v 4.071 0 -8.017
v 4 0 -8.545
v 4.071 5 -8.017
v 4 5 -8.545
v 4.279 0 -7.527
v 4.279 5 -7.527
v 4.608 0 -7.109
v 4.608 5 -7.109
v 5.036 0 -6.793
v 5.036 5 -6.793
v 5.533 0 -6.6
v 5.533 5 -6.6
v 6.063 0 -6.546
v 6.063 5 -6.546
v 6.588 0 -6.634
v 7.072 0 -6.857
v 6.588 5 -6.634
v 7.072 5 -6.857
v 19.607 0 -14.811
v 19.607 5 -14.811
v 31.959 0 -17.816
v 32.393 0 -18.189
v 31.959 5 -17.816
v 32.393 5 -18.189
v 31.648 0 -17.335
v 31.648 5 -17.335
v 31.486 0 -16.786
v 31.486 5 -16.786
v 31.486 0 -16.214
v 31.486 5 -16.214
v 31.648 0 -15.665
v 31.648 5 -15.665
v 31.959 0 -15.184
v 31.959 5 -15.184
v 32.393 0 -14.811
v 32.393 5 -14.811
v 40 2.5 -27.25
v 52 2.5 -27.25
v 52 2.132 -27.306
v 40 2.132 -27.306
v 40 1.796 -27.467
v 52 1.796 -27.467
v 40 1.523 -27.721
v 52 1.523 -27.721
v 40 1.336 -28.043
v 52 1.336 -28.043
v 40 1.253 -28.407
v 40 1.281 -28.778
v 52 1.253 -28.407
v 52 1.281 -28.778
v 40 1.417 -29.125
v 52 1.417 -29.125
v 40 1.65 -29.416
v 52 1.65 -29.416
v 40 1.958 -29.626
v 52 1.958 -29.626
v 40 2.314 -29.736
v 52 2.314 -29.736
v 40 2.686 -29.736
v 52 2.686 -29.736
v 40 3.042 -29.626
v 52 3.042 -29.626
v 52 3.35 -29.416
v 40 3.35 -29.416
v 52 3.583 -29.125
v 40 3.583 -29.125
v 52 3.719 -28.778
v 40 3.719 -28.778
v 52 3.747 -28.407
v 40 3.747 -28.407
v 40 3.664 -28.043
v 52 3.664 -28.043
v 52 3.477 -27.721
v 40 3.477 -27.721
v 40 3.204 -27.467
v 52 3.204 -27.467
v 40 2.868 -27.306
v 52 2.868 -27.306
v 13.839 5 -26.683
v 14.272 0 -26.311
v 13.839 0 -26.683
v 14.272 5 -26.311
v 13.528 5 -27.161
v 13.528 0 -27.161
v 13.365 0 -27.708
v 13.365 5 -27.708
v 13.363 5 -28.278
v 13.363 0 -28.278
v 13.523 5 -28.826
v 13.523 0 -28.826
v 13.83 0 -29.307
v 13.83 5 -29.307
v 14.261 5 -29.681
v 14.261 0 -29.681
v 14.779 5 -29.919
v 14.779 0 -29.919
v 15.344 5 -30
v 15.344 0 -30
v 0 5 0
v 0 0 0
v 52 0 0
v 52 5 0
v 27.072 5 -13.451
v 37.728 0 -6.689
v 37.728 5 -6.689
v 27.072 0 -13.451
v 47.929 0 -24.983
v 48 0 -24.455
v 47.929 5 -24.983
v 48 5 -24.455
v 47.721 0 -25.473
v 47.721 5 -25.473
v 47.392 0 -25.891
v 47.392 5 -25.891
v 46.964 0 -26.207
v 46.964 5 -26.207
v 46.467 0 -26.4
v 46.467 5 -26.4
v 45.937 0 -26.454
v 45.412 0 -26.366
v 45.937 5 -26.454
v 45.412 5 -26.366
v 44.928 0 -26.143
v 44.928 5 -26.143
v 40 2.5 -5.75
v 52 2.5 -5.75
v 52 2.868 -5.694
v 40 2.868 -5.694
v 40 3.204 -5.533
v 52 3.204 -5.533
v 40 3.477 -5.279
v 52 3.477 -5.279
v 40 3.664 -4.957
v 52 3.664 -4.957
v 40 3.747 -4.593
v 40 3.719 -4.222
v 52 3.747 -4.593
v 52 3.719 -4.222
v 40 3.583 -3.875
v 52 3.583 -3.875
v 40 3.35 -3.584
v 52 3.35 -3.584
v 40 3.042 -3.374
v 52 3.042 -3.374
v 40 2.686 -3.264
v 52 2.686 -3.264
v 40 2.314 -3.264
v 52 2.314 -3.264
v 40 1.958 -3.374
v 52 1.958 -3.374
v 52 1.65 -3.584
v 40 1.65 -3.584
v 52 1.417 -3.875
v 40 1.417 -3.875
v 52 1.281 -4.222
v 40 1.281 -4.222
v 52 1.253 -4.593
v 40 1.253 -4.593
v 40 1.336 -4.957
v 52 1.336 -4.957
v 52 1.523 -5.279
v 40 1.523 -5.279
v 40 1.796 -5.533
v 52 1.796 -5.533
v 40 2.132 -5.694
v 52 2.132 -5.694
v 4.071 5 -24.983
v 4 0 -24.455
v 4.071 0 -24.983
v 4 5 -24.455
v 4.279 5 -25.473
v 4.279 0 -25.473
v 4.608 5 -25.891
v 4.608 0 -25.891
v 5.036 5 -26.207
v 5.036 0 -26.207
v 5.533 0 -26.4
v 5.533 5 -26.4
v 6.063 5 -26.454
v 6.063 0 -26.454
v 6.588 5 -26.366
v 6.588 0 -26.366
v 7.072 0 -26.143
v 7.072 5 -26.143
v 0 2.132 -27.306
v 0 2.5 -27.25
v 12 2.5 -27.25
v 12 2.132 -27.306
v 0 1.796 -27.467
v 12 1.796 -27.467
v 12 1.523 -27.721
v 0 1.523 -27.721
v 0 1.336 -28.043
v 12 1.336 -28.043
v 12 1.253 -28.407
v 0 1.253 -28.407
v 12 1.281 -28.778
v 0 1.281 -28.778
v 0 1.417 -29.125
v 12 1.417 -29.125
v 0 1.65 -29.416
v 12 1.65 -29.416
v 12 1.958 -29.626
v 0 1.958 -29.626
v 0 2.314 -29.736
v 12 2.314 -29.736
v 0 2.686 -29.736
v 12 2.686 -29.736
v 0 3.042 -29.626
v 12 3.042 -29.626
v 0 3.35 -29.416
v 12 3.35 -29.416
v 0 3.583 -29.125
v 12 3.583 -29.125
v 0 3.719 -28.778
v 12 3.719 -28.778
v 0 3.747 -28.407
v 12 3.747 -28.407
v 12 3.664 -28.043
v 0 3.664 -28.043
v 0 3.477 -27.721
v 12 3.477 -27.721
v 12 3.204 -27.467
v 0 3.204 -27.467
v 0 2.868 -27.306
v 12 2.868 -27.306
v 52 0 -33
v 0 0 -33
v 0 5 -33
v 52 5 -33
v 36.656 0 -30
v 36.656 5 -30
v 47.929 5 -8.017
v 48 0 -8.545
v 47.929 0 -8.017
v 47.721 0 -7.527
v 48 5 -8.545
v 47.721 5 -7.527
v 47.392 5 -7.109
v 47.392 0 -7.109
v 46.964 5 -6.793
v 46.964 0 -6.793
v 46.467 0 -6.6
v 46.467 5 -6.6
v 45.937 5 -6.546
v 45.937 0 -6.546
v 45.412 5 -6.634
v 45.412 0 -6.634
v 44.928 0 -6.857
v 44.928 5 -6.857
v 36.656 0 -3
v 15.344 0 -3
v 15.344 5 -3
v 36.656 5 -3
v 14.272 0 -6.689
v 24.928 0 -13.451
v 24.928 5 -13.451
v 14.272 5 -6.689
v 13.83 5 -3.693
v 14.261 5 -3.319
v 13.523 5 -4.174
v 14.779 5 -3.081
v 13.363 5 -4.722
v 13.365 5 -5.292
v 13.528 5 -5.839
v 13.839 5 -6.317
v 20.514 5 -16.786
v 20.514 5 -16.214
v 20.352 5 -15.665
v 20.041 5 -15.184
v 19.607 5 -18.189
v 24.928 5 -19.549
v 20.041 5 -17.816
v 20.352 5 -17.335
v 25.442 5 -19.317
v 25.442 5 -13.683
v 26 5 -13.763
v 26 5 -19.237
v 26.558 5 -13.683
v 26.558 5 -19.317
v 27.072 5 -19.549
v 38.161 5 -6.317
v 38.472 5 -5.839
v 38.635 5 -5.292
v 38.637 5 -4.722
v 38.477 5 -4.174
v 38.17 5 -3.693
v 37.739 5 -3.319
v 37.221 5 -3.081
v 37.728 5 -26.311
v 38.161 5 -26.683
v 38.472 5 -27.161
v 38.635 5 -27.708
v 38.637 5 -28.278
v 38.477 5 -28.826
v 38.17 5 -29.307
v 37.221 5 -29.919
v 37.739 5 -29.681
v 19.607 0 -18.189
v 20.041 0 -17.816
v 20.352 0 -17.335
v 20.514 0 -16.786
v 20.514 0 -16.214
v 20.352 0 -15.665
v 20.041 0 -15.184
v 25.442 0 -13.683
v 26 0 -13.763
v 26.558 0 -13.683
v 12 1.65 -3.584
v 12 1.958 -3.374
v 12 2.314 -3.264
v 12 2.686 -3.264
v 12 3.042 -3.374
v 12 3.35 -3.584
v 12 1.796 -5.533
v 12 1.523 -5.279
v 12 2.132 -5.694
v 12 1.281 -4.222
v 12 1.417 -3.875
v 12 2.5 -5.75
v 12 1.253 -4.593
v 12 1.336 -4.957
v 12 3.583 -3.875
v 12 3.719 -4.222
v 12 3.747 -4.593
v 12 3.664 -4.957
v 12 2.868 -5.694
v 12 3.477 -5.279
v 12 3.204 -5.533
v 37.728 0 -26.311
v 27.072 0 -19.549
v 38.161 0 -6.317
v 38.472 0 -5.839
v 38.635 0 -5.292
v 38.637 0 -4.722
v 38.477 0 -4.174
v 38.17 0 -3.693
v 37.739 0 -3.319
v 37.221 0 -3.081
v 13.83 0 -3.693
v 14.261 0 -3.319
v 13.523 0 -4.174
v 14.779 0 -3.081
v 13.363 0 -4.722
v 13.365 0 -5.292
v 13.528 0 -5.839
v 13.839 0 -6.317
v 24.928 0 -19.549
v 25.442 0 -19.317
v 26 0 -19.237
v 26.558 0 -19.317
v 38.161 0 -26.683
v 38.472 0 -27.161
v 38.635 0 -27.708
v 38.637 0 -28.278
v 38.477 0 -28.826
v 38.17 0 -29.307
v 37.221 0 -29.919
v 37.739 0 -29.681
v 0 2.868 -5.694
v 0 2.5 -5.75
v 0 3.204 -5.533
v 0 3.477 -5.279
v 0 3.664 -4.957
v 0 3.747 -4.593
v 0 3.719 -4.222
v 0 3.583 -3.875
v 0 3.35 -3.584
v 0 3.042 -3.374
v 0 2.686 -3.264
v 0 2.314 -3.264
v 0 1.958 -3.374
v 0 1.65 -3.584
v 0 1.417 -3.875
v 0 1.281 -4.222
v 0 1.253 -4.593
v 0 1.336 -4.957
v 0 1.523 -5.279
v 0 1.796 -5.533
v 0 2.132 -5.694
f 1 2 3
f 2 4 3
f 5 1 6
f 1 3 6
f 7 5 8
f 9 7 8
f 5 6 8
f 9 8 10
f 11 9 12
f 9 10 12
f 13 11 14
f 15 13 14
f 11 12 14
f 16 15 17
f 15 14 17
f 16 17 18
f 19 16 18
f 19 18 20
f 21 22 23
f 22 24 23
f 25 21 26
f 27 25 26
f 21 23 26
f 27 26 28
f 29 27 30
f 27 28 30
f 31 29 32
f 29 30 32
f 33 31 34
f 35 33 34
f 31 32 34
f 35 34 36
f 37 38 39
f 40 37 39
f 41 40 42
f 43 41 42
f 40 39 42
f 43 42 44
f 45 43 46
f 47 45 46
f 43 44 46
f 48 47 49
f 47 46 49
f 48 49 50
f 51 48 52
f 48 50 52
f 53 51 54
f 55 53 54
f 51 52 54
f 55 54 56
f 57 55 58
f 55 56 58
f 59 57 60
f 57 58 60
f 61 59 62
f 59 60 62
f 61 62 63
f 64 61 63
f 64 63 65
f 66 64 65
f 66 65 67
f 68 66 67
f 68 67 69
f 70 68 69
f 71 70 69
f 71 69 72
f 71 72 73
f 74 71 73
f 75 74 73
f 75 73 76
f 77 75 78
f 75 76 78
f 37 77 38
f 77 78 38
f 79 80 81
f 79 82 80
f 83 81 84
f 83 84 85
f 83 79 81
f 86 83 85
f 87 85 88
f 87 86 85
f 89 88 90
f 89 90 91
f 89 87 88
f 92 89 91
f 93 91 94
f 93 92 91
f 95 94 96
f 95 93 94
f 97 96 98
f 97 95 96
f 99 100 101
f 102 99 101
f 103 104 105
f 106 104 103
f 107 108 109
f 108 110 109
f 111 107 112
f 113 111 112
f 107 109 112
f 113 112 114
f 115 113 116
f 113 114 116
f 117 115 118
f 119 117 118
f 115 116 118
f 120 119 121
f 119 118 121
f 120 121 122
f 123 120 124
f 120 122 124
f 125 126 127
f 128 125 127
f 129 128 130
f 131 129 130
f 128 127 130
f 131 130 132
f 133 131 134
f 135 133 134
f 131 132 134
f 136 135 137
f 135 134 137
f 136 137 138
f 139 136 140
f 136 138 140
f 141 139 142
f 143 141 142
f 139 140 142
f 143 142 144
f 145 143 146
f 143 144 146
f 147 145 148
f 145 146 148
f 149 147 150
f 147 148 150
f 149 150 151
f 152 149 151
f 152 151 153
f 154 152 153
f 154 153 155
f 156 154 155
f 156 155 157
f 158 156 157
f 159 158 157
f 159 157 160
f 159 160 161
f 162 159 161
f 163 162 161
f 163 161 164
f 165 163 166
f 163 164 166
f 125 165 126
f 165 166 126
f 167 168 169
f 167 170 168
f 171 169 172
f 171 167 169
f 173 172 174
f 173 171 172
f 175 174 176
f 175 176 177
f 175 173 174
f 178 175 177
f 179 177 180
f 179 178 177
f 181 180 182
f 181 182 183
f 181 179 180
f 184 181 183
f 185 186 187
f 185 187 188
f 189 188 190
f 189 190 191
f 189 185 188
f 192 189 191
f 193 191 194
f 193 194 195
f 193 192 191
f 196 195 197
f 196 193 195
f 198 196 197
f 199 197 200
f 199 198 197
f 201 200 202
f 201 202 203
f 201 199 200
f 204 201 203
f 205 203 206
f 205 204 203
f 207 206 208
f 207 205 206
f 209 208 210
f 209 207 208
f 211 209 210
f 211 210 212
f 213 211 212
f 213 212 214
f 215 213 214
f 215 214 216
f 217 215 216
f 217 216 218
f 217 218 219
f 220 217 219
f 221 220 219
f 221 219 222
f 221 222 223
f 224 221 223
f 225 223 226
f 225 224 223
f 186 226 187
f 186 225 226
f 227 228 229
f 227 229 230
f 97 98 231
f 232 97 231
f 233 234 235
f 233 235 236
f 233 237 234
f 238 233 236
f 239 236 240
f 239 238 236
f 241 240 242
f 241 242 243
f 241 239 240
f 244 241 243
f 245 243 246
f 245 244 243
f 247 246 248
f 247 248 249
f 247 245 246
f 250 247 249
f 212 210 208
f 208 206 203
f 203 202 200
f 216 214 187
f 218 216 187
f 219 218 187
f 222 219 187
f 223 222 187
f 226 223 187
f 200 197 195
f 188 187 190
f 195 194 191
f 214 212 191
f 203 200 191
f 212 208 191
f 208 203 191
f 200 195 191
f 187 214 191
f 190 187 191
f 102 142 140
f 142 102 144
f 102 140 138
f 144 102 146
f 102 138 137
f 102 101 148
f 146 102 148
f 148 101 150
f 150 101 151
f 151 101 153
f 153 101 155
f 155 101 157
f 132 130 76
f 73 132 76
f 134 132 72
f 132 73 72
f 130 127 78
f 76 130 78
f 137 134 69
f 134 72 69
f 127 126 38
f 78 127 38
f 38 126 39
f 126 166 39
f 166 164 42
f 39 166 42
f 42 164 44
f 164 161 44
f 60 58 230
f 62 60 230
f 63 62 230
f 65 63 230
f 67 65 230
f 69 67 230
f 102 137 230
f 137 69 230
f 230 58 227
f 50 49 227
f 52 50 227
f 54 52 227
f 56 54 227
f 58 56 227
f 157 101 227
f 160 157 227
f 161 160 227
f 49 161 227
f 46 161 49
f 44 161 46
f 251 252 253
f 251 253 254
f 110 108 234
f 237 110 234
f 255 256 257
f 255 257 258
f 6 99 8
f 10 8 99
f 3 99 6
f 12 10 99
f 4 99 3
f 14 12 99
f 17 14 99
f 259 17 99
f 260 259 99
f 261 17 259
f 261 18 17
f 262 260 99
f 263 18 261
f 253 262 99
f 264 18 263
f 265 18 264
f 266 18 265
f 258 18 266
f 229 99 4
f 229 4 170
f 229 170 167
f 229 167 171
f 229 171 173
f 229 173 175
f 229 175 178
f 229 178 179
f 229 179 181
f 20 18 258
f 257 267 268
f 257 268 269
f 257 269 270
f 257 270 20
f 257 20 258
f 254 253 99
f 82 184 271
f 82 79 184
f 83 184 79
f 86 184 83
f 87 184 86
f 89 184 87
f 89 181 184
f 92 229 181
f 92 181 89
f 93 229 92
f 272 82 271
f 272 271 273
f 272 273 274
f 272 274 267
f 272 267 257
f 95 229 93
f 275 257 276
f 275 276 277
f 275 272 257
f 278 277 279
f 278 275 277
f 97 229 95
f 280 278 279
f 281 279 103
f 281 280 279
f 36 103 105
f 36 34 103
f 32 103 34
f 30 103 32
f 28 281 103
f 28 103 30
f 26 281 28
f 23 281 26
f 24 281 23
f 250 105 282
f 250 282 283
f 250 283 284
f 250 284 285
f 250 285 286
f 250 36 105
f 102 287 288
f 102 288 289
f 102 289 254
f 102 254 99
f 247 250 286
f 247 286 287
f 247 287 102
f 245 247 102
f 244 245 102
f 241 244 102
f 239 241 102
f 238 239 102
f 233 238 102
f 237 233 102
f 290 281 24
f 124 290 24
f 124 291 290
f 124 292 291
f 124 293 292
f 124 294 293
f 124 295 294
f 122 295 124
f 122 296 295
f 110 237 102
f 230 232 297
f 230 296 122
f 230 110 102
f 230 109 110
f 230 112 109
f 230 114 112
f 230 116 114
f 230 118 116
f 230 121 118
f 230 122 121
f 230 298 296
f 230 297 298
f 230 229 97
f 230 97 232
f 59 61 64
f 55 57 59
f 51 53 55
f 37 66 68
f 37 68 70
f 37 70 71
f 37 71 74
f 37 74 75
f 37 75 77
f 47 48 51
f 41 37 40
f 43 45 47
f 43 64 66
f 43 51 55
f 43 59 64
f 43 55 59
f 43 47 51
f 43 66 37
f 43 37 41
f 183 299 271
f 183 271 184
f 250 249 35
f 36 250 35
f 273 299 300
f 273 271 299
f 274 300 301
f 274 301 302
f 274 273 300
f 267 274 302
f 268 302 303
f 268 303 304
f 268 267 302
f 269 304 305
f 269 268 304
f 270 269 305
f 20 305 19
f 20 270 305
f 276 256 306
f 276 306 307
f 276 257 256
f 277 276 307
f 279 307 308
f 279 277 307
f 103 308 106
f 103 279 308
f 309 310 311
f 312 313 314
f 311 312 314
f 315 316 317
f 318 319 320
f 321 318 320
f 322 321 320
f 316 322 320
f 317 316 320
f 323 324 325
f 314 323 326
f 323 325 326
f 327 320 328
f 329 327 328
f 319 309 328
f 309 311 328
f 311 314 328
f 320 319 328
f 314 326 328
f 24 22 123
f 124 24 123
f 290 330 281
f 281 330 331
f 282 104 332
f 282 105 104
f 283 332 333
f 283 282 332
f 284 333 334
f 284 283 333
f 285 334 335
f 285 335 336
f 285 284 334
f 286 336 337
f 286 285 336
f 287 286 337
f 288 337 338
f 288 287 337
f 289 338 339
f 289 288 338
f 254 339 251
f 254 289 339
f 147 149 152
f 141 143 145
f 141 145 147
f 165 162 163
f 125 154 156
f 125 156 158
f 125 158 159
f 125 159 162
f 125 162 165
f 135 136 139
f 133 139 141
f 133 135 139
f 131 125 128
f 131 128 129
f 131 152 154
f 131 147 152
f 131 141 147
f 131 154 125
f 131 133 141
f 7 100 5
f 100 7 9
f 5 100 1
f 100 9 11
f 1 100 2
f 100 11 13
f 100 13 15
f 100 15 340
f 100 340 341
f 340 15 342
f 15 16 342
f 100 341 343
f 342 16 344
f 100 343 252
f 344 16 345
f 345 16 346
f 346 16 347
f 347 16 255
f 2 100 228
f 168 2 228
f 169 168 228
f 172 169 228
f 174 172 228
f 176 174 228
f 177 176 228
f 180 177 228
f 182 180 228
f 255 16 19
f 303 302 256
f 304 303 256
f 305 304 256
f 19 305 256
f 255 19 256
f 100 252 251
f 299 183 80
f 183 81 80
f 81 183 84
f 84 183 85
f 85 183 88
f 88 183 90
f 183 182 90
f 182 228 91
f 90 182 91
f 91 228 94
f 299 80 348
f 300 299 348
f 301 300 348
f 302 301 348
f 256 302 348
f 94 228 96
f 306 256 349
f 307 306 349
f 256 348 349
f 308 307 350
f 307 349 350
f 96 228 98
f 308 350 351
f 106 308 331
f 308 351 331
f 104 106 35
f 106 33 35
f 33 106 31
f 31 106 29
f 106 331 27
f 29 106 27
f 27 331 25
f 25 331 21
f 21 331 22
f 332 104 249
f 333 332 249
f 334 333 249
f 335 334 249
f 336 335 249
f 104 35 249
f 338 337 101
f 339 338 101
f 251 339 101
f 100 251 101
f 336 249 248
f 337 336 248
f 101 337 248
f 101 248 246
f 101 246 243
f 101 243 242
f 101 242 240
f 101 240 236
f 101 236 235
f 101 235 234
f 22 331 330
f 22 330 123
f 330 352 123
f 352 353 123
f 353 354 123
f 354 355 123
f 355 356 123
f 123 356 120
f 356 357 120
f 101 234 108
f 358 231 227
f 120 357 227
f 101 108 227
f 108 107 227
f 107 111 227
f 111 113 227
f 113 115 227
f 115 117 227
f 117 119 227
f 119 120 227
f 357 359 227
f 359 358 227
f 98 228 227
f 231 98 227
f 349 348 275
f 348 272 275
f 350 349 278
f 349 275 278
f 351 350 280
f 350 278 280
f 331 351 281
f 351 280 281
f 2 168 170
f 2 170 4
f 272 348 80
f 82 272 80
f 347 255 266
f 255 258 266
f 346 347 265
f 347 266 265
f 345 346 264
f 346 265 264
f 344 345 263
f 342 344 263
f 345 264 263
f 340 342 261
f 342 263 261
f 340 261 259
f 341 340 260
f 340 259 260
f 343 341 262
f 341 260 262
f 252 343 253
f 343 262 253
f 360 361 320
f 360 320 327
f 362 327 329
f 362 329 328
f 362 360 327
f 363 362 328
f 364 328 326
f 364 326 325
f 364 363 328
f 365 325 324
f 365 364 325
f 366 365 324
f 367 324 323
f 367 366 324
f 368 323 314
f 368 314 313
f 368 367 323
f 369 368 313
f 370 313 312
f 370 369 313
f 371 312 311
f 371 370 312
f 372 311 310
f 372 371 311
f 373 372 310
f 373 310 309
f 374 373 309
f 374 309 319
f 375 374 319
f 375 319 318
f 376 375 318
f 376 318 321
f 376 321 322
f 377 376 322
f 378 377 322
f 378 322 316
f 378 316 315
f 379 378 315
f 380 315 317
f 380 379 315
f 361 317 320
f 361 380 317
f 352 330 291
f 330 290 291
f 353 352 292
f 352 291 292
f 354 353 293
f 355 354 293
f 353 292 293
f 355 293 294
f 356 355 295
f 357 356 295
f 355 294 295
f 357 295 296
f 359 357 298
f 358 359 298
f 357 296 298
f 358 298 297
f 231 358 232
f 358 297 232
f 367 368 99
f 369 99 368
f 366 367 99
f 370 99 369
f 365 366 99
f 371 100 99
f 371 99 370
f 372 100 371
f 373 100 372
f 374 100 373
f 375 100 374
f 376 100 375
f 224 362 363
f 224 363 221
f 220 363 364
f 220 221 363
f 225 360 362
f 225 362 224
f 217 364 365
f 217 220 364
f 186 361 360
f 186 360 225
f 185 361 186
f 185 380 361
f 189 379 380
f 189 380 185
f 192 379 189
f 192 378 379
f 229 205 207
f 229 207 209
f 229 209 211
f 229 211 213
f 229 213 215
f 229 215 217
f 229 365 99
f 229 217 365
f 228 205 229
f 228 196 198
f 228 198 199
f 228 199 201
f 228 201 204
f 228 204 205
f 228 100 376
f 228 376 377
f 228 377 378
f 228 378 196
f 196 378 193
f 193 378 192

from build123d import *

# Parameters (mm, degrees)
SKETCH1_W           = 52
SKETCH1_H           = 33
BOSS_EXTRUDE1_DEPTH = 5
FILLET1_R           = 2
SKETCH2_R           = 1.25
CUT_EXTRUDE1_DEPTH  = 12


with BuildPart() as part:
    # Sketch1 → Boss-Extrude1 (new body)
    with BuildSketch(Plane(origin=(0, 0, 0), x_dir=(1, 0, 0), z_dir=(0, 1, 0))):
        with Locations((26, 16.5)):
            Rectangle(SKETCH1_W, SKETCH1_H)
        Polygon((4, 28.092794755), (4, 4.907205245), (22.26743416, 16.5), align=None, mode=Mode.SUBTRACT)
        Polygon((26, 14.131256294), (8.459838567, 3), (43.540161433, 3), align=None, mode=Mode.SUBTRACT)
        Polygon((48, 4.907205245), (29.73256584, 16.5), (48, 28.092794755), align=None, mode=Mode.SUBTRACT)
        Polygon((8.459838567, 30), (43.540161433, 30), (26, 18.868743706), align=None, mode=Mode.SUBTRACT)
    extrude(amount=BOSS_EXTRUDE1_DEPTH)

    # Fillet1
    fillet1_edges = [part.edges().sort_by_distance(p)[0] for p in [
        (22.26743416, 2.5, -16.5),
        (4, 2.5, -28.092794755),
        (4, 2.5, -4.907205245),
        (43.540161433, 2.5, -3),
        (26, 2.5, -14.131256294),
        (8.459838567, 2.5, -3),
        (48, 2.5, -4.907205245),
        (48, 2.5, -28.092794755),
        (29.73256584, 2.5, -16.5),
        (8.459838567, 2.5, -30),
        (26, 2.5, -18.868743706),
        (43.540161433, 2.5, -30),
    ]]
    fillet(fillet1_edges, radius=FILLET1_R)

    # Sketch2 → Cut-Extrude1 (cut)
    with BuildSketch(Plane(origin=(52, 0, 0), x_dir=(0, 0, -1), z_dir=(1, 0, 0))):
        with Locations((4.5, 2.5)):
            Circle(SKETCH2_R)
        with Locations(Location((28.5, 2.5, 0), (0, 0, 180))):
            Circle(SKETCH2_R)
    cut_extrude1 = extrude(amount=-CUT_EXTRUDE1_DEPTH, mode=Mode.SUBTRACT)

    # Mirror1: Cut-Extrude1 across plane
    add(cut_extrude1.mirror(Plane(origin=(26, 0, 0), x_dir=(0, 0, 1), z_dir=(1, 0, 0))), mode=Mode.SUBTRACT)


solid = part.part
